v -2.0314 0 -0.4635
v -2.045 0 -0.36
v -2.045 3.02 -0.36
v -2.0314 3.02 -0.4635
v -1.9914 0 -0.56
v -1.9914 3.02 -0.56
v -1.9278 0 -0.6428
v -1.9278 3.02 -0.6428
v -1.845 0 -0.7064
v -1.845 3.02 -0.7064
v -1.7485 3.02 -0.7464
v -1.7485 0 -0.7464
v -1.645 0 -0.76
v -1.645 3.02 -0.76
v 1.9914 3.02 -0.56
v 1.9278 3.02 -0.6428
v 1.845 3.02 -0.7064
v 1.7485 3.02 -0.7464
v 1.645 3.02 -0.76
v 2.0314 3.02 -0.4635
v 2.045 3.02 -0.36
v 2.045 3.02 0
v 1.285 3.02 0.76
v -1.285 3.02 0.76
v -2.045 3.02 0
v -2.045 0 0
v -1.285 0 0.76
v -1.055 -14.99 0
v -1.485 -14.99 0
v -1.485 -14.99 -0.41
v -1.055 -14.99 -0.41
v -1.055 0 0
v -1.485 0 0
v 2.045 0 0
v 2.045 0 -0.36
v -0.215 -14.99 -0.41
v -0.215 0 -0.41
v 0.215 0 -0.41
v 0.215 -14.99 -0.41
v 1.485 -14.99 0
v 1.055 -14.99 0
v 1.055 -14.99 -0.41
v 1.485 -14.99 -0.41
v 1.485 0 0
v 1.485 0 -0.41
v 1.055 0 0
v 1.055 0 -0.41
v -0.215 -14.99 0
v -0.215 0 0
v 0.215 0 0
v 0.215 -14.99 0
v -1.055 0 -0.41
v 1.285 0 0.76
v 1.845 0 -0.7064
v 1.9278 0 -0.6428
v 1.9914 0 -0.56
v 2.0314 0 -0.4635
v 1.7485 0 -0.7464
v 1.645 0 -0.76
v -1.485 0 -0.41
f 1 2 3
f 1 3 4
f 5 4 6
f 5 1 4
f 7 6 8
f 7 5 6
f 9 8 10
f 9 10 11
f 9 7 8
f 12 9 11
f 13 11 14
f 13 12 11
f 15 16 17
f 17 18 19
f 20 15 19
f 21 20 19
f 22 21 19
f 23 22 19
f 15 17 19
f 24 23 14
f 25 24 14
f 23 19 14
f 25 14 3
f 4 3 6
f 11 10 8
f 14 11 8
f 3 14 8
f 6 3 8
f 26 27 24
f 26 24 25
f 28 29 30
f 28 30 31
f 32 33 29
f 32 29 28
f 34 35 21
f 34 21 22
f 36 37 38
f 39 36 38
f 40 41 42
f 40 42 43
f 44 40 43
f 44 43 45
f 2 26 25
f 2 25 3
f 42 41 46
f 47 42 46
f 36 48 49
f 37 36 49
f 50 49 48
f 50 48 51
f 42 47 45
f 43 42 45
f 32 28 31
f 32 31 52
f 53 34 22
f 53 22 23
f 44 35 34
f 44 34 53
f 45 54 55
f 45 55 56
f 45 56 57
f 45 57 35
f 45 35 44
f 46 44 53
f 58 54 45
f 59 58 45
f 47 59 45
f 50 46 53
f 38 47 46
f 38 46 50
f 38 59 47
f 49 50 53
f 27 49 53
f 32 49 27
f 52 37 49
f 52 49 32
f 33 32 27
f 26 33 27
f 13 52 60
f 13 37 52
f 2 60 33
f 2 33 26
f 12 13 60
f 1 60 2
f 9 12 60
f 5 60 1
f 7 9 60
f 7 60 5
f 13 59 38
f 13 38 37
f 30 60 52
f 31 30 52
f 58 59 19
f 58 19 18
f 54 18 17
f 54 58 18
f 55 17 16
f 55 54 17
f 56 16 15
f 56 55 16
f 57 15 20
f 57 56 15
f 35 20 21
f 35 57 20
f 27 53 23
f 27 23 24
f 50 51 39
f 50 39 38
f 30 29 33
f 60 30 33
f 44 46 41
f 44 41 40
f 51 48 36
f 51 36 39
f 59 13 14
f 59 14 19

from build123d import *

# Parameters (mm, degrees)
BOSS_EXTRUDE1_DEPTH = 3.02
SKETCH3_W           = 0.43
SKETCH3_H           = 14.99
BOSS_EXTRUDE2_DEPTH = 0.41


with BuildPart() as part:
    # Sketch2 → Boss-Extrude1 (new body)
    with BuildSketch(Plane(origin=(0, 0, 0), x_dir=(1, 0, 0), z_dir=(0, 1, 0))):
        with BuildLine():
            Line((-1.645, 0.76), (1.645, 0.76))
            ThreePointArc((1.645, 0.76), (1.927842712, 0.642842712), (2.045, 0.36))
            Line((2.045, 0.36), (2.045, 0))
            Line((2.045, 0), (1.285, -0.76))
            Line((1.285, -0.76), (-1.285, -0.76))
            Line((-1.285, -0.76), (-2.045, 0))
            Line((-2.045, 0), (-2.045, 0.36))
            ThreePointArc((-2.045, 0.36), (-1.927842712, 0.642842712), (-1.645, 0.76))
        make_face()
    extrude(amount=BOSS_EXTRUDE1_DEPTH)

    # Sketch3 → Boss-Extrude2 (add)
    with BuildSketch(Plane.XY):
        with Locations((0, -7.495)):
            Rectangle(SKETCH3_W, SKETCH3_H)
        with Locations((1.27, -7.495)):
            Rectangle(SKETCH3_W, SKETCH3_H)
        with Locations((-1.27, -7.495)):
            Rectangle(SKETCH3_W, SKETCH3_H)
    extrude(amount=-BOSS_EXTRUDE2_DEPTH)


solid = part.part
